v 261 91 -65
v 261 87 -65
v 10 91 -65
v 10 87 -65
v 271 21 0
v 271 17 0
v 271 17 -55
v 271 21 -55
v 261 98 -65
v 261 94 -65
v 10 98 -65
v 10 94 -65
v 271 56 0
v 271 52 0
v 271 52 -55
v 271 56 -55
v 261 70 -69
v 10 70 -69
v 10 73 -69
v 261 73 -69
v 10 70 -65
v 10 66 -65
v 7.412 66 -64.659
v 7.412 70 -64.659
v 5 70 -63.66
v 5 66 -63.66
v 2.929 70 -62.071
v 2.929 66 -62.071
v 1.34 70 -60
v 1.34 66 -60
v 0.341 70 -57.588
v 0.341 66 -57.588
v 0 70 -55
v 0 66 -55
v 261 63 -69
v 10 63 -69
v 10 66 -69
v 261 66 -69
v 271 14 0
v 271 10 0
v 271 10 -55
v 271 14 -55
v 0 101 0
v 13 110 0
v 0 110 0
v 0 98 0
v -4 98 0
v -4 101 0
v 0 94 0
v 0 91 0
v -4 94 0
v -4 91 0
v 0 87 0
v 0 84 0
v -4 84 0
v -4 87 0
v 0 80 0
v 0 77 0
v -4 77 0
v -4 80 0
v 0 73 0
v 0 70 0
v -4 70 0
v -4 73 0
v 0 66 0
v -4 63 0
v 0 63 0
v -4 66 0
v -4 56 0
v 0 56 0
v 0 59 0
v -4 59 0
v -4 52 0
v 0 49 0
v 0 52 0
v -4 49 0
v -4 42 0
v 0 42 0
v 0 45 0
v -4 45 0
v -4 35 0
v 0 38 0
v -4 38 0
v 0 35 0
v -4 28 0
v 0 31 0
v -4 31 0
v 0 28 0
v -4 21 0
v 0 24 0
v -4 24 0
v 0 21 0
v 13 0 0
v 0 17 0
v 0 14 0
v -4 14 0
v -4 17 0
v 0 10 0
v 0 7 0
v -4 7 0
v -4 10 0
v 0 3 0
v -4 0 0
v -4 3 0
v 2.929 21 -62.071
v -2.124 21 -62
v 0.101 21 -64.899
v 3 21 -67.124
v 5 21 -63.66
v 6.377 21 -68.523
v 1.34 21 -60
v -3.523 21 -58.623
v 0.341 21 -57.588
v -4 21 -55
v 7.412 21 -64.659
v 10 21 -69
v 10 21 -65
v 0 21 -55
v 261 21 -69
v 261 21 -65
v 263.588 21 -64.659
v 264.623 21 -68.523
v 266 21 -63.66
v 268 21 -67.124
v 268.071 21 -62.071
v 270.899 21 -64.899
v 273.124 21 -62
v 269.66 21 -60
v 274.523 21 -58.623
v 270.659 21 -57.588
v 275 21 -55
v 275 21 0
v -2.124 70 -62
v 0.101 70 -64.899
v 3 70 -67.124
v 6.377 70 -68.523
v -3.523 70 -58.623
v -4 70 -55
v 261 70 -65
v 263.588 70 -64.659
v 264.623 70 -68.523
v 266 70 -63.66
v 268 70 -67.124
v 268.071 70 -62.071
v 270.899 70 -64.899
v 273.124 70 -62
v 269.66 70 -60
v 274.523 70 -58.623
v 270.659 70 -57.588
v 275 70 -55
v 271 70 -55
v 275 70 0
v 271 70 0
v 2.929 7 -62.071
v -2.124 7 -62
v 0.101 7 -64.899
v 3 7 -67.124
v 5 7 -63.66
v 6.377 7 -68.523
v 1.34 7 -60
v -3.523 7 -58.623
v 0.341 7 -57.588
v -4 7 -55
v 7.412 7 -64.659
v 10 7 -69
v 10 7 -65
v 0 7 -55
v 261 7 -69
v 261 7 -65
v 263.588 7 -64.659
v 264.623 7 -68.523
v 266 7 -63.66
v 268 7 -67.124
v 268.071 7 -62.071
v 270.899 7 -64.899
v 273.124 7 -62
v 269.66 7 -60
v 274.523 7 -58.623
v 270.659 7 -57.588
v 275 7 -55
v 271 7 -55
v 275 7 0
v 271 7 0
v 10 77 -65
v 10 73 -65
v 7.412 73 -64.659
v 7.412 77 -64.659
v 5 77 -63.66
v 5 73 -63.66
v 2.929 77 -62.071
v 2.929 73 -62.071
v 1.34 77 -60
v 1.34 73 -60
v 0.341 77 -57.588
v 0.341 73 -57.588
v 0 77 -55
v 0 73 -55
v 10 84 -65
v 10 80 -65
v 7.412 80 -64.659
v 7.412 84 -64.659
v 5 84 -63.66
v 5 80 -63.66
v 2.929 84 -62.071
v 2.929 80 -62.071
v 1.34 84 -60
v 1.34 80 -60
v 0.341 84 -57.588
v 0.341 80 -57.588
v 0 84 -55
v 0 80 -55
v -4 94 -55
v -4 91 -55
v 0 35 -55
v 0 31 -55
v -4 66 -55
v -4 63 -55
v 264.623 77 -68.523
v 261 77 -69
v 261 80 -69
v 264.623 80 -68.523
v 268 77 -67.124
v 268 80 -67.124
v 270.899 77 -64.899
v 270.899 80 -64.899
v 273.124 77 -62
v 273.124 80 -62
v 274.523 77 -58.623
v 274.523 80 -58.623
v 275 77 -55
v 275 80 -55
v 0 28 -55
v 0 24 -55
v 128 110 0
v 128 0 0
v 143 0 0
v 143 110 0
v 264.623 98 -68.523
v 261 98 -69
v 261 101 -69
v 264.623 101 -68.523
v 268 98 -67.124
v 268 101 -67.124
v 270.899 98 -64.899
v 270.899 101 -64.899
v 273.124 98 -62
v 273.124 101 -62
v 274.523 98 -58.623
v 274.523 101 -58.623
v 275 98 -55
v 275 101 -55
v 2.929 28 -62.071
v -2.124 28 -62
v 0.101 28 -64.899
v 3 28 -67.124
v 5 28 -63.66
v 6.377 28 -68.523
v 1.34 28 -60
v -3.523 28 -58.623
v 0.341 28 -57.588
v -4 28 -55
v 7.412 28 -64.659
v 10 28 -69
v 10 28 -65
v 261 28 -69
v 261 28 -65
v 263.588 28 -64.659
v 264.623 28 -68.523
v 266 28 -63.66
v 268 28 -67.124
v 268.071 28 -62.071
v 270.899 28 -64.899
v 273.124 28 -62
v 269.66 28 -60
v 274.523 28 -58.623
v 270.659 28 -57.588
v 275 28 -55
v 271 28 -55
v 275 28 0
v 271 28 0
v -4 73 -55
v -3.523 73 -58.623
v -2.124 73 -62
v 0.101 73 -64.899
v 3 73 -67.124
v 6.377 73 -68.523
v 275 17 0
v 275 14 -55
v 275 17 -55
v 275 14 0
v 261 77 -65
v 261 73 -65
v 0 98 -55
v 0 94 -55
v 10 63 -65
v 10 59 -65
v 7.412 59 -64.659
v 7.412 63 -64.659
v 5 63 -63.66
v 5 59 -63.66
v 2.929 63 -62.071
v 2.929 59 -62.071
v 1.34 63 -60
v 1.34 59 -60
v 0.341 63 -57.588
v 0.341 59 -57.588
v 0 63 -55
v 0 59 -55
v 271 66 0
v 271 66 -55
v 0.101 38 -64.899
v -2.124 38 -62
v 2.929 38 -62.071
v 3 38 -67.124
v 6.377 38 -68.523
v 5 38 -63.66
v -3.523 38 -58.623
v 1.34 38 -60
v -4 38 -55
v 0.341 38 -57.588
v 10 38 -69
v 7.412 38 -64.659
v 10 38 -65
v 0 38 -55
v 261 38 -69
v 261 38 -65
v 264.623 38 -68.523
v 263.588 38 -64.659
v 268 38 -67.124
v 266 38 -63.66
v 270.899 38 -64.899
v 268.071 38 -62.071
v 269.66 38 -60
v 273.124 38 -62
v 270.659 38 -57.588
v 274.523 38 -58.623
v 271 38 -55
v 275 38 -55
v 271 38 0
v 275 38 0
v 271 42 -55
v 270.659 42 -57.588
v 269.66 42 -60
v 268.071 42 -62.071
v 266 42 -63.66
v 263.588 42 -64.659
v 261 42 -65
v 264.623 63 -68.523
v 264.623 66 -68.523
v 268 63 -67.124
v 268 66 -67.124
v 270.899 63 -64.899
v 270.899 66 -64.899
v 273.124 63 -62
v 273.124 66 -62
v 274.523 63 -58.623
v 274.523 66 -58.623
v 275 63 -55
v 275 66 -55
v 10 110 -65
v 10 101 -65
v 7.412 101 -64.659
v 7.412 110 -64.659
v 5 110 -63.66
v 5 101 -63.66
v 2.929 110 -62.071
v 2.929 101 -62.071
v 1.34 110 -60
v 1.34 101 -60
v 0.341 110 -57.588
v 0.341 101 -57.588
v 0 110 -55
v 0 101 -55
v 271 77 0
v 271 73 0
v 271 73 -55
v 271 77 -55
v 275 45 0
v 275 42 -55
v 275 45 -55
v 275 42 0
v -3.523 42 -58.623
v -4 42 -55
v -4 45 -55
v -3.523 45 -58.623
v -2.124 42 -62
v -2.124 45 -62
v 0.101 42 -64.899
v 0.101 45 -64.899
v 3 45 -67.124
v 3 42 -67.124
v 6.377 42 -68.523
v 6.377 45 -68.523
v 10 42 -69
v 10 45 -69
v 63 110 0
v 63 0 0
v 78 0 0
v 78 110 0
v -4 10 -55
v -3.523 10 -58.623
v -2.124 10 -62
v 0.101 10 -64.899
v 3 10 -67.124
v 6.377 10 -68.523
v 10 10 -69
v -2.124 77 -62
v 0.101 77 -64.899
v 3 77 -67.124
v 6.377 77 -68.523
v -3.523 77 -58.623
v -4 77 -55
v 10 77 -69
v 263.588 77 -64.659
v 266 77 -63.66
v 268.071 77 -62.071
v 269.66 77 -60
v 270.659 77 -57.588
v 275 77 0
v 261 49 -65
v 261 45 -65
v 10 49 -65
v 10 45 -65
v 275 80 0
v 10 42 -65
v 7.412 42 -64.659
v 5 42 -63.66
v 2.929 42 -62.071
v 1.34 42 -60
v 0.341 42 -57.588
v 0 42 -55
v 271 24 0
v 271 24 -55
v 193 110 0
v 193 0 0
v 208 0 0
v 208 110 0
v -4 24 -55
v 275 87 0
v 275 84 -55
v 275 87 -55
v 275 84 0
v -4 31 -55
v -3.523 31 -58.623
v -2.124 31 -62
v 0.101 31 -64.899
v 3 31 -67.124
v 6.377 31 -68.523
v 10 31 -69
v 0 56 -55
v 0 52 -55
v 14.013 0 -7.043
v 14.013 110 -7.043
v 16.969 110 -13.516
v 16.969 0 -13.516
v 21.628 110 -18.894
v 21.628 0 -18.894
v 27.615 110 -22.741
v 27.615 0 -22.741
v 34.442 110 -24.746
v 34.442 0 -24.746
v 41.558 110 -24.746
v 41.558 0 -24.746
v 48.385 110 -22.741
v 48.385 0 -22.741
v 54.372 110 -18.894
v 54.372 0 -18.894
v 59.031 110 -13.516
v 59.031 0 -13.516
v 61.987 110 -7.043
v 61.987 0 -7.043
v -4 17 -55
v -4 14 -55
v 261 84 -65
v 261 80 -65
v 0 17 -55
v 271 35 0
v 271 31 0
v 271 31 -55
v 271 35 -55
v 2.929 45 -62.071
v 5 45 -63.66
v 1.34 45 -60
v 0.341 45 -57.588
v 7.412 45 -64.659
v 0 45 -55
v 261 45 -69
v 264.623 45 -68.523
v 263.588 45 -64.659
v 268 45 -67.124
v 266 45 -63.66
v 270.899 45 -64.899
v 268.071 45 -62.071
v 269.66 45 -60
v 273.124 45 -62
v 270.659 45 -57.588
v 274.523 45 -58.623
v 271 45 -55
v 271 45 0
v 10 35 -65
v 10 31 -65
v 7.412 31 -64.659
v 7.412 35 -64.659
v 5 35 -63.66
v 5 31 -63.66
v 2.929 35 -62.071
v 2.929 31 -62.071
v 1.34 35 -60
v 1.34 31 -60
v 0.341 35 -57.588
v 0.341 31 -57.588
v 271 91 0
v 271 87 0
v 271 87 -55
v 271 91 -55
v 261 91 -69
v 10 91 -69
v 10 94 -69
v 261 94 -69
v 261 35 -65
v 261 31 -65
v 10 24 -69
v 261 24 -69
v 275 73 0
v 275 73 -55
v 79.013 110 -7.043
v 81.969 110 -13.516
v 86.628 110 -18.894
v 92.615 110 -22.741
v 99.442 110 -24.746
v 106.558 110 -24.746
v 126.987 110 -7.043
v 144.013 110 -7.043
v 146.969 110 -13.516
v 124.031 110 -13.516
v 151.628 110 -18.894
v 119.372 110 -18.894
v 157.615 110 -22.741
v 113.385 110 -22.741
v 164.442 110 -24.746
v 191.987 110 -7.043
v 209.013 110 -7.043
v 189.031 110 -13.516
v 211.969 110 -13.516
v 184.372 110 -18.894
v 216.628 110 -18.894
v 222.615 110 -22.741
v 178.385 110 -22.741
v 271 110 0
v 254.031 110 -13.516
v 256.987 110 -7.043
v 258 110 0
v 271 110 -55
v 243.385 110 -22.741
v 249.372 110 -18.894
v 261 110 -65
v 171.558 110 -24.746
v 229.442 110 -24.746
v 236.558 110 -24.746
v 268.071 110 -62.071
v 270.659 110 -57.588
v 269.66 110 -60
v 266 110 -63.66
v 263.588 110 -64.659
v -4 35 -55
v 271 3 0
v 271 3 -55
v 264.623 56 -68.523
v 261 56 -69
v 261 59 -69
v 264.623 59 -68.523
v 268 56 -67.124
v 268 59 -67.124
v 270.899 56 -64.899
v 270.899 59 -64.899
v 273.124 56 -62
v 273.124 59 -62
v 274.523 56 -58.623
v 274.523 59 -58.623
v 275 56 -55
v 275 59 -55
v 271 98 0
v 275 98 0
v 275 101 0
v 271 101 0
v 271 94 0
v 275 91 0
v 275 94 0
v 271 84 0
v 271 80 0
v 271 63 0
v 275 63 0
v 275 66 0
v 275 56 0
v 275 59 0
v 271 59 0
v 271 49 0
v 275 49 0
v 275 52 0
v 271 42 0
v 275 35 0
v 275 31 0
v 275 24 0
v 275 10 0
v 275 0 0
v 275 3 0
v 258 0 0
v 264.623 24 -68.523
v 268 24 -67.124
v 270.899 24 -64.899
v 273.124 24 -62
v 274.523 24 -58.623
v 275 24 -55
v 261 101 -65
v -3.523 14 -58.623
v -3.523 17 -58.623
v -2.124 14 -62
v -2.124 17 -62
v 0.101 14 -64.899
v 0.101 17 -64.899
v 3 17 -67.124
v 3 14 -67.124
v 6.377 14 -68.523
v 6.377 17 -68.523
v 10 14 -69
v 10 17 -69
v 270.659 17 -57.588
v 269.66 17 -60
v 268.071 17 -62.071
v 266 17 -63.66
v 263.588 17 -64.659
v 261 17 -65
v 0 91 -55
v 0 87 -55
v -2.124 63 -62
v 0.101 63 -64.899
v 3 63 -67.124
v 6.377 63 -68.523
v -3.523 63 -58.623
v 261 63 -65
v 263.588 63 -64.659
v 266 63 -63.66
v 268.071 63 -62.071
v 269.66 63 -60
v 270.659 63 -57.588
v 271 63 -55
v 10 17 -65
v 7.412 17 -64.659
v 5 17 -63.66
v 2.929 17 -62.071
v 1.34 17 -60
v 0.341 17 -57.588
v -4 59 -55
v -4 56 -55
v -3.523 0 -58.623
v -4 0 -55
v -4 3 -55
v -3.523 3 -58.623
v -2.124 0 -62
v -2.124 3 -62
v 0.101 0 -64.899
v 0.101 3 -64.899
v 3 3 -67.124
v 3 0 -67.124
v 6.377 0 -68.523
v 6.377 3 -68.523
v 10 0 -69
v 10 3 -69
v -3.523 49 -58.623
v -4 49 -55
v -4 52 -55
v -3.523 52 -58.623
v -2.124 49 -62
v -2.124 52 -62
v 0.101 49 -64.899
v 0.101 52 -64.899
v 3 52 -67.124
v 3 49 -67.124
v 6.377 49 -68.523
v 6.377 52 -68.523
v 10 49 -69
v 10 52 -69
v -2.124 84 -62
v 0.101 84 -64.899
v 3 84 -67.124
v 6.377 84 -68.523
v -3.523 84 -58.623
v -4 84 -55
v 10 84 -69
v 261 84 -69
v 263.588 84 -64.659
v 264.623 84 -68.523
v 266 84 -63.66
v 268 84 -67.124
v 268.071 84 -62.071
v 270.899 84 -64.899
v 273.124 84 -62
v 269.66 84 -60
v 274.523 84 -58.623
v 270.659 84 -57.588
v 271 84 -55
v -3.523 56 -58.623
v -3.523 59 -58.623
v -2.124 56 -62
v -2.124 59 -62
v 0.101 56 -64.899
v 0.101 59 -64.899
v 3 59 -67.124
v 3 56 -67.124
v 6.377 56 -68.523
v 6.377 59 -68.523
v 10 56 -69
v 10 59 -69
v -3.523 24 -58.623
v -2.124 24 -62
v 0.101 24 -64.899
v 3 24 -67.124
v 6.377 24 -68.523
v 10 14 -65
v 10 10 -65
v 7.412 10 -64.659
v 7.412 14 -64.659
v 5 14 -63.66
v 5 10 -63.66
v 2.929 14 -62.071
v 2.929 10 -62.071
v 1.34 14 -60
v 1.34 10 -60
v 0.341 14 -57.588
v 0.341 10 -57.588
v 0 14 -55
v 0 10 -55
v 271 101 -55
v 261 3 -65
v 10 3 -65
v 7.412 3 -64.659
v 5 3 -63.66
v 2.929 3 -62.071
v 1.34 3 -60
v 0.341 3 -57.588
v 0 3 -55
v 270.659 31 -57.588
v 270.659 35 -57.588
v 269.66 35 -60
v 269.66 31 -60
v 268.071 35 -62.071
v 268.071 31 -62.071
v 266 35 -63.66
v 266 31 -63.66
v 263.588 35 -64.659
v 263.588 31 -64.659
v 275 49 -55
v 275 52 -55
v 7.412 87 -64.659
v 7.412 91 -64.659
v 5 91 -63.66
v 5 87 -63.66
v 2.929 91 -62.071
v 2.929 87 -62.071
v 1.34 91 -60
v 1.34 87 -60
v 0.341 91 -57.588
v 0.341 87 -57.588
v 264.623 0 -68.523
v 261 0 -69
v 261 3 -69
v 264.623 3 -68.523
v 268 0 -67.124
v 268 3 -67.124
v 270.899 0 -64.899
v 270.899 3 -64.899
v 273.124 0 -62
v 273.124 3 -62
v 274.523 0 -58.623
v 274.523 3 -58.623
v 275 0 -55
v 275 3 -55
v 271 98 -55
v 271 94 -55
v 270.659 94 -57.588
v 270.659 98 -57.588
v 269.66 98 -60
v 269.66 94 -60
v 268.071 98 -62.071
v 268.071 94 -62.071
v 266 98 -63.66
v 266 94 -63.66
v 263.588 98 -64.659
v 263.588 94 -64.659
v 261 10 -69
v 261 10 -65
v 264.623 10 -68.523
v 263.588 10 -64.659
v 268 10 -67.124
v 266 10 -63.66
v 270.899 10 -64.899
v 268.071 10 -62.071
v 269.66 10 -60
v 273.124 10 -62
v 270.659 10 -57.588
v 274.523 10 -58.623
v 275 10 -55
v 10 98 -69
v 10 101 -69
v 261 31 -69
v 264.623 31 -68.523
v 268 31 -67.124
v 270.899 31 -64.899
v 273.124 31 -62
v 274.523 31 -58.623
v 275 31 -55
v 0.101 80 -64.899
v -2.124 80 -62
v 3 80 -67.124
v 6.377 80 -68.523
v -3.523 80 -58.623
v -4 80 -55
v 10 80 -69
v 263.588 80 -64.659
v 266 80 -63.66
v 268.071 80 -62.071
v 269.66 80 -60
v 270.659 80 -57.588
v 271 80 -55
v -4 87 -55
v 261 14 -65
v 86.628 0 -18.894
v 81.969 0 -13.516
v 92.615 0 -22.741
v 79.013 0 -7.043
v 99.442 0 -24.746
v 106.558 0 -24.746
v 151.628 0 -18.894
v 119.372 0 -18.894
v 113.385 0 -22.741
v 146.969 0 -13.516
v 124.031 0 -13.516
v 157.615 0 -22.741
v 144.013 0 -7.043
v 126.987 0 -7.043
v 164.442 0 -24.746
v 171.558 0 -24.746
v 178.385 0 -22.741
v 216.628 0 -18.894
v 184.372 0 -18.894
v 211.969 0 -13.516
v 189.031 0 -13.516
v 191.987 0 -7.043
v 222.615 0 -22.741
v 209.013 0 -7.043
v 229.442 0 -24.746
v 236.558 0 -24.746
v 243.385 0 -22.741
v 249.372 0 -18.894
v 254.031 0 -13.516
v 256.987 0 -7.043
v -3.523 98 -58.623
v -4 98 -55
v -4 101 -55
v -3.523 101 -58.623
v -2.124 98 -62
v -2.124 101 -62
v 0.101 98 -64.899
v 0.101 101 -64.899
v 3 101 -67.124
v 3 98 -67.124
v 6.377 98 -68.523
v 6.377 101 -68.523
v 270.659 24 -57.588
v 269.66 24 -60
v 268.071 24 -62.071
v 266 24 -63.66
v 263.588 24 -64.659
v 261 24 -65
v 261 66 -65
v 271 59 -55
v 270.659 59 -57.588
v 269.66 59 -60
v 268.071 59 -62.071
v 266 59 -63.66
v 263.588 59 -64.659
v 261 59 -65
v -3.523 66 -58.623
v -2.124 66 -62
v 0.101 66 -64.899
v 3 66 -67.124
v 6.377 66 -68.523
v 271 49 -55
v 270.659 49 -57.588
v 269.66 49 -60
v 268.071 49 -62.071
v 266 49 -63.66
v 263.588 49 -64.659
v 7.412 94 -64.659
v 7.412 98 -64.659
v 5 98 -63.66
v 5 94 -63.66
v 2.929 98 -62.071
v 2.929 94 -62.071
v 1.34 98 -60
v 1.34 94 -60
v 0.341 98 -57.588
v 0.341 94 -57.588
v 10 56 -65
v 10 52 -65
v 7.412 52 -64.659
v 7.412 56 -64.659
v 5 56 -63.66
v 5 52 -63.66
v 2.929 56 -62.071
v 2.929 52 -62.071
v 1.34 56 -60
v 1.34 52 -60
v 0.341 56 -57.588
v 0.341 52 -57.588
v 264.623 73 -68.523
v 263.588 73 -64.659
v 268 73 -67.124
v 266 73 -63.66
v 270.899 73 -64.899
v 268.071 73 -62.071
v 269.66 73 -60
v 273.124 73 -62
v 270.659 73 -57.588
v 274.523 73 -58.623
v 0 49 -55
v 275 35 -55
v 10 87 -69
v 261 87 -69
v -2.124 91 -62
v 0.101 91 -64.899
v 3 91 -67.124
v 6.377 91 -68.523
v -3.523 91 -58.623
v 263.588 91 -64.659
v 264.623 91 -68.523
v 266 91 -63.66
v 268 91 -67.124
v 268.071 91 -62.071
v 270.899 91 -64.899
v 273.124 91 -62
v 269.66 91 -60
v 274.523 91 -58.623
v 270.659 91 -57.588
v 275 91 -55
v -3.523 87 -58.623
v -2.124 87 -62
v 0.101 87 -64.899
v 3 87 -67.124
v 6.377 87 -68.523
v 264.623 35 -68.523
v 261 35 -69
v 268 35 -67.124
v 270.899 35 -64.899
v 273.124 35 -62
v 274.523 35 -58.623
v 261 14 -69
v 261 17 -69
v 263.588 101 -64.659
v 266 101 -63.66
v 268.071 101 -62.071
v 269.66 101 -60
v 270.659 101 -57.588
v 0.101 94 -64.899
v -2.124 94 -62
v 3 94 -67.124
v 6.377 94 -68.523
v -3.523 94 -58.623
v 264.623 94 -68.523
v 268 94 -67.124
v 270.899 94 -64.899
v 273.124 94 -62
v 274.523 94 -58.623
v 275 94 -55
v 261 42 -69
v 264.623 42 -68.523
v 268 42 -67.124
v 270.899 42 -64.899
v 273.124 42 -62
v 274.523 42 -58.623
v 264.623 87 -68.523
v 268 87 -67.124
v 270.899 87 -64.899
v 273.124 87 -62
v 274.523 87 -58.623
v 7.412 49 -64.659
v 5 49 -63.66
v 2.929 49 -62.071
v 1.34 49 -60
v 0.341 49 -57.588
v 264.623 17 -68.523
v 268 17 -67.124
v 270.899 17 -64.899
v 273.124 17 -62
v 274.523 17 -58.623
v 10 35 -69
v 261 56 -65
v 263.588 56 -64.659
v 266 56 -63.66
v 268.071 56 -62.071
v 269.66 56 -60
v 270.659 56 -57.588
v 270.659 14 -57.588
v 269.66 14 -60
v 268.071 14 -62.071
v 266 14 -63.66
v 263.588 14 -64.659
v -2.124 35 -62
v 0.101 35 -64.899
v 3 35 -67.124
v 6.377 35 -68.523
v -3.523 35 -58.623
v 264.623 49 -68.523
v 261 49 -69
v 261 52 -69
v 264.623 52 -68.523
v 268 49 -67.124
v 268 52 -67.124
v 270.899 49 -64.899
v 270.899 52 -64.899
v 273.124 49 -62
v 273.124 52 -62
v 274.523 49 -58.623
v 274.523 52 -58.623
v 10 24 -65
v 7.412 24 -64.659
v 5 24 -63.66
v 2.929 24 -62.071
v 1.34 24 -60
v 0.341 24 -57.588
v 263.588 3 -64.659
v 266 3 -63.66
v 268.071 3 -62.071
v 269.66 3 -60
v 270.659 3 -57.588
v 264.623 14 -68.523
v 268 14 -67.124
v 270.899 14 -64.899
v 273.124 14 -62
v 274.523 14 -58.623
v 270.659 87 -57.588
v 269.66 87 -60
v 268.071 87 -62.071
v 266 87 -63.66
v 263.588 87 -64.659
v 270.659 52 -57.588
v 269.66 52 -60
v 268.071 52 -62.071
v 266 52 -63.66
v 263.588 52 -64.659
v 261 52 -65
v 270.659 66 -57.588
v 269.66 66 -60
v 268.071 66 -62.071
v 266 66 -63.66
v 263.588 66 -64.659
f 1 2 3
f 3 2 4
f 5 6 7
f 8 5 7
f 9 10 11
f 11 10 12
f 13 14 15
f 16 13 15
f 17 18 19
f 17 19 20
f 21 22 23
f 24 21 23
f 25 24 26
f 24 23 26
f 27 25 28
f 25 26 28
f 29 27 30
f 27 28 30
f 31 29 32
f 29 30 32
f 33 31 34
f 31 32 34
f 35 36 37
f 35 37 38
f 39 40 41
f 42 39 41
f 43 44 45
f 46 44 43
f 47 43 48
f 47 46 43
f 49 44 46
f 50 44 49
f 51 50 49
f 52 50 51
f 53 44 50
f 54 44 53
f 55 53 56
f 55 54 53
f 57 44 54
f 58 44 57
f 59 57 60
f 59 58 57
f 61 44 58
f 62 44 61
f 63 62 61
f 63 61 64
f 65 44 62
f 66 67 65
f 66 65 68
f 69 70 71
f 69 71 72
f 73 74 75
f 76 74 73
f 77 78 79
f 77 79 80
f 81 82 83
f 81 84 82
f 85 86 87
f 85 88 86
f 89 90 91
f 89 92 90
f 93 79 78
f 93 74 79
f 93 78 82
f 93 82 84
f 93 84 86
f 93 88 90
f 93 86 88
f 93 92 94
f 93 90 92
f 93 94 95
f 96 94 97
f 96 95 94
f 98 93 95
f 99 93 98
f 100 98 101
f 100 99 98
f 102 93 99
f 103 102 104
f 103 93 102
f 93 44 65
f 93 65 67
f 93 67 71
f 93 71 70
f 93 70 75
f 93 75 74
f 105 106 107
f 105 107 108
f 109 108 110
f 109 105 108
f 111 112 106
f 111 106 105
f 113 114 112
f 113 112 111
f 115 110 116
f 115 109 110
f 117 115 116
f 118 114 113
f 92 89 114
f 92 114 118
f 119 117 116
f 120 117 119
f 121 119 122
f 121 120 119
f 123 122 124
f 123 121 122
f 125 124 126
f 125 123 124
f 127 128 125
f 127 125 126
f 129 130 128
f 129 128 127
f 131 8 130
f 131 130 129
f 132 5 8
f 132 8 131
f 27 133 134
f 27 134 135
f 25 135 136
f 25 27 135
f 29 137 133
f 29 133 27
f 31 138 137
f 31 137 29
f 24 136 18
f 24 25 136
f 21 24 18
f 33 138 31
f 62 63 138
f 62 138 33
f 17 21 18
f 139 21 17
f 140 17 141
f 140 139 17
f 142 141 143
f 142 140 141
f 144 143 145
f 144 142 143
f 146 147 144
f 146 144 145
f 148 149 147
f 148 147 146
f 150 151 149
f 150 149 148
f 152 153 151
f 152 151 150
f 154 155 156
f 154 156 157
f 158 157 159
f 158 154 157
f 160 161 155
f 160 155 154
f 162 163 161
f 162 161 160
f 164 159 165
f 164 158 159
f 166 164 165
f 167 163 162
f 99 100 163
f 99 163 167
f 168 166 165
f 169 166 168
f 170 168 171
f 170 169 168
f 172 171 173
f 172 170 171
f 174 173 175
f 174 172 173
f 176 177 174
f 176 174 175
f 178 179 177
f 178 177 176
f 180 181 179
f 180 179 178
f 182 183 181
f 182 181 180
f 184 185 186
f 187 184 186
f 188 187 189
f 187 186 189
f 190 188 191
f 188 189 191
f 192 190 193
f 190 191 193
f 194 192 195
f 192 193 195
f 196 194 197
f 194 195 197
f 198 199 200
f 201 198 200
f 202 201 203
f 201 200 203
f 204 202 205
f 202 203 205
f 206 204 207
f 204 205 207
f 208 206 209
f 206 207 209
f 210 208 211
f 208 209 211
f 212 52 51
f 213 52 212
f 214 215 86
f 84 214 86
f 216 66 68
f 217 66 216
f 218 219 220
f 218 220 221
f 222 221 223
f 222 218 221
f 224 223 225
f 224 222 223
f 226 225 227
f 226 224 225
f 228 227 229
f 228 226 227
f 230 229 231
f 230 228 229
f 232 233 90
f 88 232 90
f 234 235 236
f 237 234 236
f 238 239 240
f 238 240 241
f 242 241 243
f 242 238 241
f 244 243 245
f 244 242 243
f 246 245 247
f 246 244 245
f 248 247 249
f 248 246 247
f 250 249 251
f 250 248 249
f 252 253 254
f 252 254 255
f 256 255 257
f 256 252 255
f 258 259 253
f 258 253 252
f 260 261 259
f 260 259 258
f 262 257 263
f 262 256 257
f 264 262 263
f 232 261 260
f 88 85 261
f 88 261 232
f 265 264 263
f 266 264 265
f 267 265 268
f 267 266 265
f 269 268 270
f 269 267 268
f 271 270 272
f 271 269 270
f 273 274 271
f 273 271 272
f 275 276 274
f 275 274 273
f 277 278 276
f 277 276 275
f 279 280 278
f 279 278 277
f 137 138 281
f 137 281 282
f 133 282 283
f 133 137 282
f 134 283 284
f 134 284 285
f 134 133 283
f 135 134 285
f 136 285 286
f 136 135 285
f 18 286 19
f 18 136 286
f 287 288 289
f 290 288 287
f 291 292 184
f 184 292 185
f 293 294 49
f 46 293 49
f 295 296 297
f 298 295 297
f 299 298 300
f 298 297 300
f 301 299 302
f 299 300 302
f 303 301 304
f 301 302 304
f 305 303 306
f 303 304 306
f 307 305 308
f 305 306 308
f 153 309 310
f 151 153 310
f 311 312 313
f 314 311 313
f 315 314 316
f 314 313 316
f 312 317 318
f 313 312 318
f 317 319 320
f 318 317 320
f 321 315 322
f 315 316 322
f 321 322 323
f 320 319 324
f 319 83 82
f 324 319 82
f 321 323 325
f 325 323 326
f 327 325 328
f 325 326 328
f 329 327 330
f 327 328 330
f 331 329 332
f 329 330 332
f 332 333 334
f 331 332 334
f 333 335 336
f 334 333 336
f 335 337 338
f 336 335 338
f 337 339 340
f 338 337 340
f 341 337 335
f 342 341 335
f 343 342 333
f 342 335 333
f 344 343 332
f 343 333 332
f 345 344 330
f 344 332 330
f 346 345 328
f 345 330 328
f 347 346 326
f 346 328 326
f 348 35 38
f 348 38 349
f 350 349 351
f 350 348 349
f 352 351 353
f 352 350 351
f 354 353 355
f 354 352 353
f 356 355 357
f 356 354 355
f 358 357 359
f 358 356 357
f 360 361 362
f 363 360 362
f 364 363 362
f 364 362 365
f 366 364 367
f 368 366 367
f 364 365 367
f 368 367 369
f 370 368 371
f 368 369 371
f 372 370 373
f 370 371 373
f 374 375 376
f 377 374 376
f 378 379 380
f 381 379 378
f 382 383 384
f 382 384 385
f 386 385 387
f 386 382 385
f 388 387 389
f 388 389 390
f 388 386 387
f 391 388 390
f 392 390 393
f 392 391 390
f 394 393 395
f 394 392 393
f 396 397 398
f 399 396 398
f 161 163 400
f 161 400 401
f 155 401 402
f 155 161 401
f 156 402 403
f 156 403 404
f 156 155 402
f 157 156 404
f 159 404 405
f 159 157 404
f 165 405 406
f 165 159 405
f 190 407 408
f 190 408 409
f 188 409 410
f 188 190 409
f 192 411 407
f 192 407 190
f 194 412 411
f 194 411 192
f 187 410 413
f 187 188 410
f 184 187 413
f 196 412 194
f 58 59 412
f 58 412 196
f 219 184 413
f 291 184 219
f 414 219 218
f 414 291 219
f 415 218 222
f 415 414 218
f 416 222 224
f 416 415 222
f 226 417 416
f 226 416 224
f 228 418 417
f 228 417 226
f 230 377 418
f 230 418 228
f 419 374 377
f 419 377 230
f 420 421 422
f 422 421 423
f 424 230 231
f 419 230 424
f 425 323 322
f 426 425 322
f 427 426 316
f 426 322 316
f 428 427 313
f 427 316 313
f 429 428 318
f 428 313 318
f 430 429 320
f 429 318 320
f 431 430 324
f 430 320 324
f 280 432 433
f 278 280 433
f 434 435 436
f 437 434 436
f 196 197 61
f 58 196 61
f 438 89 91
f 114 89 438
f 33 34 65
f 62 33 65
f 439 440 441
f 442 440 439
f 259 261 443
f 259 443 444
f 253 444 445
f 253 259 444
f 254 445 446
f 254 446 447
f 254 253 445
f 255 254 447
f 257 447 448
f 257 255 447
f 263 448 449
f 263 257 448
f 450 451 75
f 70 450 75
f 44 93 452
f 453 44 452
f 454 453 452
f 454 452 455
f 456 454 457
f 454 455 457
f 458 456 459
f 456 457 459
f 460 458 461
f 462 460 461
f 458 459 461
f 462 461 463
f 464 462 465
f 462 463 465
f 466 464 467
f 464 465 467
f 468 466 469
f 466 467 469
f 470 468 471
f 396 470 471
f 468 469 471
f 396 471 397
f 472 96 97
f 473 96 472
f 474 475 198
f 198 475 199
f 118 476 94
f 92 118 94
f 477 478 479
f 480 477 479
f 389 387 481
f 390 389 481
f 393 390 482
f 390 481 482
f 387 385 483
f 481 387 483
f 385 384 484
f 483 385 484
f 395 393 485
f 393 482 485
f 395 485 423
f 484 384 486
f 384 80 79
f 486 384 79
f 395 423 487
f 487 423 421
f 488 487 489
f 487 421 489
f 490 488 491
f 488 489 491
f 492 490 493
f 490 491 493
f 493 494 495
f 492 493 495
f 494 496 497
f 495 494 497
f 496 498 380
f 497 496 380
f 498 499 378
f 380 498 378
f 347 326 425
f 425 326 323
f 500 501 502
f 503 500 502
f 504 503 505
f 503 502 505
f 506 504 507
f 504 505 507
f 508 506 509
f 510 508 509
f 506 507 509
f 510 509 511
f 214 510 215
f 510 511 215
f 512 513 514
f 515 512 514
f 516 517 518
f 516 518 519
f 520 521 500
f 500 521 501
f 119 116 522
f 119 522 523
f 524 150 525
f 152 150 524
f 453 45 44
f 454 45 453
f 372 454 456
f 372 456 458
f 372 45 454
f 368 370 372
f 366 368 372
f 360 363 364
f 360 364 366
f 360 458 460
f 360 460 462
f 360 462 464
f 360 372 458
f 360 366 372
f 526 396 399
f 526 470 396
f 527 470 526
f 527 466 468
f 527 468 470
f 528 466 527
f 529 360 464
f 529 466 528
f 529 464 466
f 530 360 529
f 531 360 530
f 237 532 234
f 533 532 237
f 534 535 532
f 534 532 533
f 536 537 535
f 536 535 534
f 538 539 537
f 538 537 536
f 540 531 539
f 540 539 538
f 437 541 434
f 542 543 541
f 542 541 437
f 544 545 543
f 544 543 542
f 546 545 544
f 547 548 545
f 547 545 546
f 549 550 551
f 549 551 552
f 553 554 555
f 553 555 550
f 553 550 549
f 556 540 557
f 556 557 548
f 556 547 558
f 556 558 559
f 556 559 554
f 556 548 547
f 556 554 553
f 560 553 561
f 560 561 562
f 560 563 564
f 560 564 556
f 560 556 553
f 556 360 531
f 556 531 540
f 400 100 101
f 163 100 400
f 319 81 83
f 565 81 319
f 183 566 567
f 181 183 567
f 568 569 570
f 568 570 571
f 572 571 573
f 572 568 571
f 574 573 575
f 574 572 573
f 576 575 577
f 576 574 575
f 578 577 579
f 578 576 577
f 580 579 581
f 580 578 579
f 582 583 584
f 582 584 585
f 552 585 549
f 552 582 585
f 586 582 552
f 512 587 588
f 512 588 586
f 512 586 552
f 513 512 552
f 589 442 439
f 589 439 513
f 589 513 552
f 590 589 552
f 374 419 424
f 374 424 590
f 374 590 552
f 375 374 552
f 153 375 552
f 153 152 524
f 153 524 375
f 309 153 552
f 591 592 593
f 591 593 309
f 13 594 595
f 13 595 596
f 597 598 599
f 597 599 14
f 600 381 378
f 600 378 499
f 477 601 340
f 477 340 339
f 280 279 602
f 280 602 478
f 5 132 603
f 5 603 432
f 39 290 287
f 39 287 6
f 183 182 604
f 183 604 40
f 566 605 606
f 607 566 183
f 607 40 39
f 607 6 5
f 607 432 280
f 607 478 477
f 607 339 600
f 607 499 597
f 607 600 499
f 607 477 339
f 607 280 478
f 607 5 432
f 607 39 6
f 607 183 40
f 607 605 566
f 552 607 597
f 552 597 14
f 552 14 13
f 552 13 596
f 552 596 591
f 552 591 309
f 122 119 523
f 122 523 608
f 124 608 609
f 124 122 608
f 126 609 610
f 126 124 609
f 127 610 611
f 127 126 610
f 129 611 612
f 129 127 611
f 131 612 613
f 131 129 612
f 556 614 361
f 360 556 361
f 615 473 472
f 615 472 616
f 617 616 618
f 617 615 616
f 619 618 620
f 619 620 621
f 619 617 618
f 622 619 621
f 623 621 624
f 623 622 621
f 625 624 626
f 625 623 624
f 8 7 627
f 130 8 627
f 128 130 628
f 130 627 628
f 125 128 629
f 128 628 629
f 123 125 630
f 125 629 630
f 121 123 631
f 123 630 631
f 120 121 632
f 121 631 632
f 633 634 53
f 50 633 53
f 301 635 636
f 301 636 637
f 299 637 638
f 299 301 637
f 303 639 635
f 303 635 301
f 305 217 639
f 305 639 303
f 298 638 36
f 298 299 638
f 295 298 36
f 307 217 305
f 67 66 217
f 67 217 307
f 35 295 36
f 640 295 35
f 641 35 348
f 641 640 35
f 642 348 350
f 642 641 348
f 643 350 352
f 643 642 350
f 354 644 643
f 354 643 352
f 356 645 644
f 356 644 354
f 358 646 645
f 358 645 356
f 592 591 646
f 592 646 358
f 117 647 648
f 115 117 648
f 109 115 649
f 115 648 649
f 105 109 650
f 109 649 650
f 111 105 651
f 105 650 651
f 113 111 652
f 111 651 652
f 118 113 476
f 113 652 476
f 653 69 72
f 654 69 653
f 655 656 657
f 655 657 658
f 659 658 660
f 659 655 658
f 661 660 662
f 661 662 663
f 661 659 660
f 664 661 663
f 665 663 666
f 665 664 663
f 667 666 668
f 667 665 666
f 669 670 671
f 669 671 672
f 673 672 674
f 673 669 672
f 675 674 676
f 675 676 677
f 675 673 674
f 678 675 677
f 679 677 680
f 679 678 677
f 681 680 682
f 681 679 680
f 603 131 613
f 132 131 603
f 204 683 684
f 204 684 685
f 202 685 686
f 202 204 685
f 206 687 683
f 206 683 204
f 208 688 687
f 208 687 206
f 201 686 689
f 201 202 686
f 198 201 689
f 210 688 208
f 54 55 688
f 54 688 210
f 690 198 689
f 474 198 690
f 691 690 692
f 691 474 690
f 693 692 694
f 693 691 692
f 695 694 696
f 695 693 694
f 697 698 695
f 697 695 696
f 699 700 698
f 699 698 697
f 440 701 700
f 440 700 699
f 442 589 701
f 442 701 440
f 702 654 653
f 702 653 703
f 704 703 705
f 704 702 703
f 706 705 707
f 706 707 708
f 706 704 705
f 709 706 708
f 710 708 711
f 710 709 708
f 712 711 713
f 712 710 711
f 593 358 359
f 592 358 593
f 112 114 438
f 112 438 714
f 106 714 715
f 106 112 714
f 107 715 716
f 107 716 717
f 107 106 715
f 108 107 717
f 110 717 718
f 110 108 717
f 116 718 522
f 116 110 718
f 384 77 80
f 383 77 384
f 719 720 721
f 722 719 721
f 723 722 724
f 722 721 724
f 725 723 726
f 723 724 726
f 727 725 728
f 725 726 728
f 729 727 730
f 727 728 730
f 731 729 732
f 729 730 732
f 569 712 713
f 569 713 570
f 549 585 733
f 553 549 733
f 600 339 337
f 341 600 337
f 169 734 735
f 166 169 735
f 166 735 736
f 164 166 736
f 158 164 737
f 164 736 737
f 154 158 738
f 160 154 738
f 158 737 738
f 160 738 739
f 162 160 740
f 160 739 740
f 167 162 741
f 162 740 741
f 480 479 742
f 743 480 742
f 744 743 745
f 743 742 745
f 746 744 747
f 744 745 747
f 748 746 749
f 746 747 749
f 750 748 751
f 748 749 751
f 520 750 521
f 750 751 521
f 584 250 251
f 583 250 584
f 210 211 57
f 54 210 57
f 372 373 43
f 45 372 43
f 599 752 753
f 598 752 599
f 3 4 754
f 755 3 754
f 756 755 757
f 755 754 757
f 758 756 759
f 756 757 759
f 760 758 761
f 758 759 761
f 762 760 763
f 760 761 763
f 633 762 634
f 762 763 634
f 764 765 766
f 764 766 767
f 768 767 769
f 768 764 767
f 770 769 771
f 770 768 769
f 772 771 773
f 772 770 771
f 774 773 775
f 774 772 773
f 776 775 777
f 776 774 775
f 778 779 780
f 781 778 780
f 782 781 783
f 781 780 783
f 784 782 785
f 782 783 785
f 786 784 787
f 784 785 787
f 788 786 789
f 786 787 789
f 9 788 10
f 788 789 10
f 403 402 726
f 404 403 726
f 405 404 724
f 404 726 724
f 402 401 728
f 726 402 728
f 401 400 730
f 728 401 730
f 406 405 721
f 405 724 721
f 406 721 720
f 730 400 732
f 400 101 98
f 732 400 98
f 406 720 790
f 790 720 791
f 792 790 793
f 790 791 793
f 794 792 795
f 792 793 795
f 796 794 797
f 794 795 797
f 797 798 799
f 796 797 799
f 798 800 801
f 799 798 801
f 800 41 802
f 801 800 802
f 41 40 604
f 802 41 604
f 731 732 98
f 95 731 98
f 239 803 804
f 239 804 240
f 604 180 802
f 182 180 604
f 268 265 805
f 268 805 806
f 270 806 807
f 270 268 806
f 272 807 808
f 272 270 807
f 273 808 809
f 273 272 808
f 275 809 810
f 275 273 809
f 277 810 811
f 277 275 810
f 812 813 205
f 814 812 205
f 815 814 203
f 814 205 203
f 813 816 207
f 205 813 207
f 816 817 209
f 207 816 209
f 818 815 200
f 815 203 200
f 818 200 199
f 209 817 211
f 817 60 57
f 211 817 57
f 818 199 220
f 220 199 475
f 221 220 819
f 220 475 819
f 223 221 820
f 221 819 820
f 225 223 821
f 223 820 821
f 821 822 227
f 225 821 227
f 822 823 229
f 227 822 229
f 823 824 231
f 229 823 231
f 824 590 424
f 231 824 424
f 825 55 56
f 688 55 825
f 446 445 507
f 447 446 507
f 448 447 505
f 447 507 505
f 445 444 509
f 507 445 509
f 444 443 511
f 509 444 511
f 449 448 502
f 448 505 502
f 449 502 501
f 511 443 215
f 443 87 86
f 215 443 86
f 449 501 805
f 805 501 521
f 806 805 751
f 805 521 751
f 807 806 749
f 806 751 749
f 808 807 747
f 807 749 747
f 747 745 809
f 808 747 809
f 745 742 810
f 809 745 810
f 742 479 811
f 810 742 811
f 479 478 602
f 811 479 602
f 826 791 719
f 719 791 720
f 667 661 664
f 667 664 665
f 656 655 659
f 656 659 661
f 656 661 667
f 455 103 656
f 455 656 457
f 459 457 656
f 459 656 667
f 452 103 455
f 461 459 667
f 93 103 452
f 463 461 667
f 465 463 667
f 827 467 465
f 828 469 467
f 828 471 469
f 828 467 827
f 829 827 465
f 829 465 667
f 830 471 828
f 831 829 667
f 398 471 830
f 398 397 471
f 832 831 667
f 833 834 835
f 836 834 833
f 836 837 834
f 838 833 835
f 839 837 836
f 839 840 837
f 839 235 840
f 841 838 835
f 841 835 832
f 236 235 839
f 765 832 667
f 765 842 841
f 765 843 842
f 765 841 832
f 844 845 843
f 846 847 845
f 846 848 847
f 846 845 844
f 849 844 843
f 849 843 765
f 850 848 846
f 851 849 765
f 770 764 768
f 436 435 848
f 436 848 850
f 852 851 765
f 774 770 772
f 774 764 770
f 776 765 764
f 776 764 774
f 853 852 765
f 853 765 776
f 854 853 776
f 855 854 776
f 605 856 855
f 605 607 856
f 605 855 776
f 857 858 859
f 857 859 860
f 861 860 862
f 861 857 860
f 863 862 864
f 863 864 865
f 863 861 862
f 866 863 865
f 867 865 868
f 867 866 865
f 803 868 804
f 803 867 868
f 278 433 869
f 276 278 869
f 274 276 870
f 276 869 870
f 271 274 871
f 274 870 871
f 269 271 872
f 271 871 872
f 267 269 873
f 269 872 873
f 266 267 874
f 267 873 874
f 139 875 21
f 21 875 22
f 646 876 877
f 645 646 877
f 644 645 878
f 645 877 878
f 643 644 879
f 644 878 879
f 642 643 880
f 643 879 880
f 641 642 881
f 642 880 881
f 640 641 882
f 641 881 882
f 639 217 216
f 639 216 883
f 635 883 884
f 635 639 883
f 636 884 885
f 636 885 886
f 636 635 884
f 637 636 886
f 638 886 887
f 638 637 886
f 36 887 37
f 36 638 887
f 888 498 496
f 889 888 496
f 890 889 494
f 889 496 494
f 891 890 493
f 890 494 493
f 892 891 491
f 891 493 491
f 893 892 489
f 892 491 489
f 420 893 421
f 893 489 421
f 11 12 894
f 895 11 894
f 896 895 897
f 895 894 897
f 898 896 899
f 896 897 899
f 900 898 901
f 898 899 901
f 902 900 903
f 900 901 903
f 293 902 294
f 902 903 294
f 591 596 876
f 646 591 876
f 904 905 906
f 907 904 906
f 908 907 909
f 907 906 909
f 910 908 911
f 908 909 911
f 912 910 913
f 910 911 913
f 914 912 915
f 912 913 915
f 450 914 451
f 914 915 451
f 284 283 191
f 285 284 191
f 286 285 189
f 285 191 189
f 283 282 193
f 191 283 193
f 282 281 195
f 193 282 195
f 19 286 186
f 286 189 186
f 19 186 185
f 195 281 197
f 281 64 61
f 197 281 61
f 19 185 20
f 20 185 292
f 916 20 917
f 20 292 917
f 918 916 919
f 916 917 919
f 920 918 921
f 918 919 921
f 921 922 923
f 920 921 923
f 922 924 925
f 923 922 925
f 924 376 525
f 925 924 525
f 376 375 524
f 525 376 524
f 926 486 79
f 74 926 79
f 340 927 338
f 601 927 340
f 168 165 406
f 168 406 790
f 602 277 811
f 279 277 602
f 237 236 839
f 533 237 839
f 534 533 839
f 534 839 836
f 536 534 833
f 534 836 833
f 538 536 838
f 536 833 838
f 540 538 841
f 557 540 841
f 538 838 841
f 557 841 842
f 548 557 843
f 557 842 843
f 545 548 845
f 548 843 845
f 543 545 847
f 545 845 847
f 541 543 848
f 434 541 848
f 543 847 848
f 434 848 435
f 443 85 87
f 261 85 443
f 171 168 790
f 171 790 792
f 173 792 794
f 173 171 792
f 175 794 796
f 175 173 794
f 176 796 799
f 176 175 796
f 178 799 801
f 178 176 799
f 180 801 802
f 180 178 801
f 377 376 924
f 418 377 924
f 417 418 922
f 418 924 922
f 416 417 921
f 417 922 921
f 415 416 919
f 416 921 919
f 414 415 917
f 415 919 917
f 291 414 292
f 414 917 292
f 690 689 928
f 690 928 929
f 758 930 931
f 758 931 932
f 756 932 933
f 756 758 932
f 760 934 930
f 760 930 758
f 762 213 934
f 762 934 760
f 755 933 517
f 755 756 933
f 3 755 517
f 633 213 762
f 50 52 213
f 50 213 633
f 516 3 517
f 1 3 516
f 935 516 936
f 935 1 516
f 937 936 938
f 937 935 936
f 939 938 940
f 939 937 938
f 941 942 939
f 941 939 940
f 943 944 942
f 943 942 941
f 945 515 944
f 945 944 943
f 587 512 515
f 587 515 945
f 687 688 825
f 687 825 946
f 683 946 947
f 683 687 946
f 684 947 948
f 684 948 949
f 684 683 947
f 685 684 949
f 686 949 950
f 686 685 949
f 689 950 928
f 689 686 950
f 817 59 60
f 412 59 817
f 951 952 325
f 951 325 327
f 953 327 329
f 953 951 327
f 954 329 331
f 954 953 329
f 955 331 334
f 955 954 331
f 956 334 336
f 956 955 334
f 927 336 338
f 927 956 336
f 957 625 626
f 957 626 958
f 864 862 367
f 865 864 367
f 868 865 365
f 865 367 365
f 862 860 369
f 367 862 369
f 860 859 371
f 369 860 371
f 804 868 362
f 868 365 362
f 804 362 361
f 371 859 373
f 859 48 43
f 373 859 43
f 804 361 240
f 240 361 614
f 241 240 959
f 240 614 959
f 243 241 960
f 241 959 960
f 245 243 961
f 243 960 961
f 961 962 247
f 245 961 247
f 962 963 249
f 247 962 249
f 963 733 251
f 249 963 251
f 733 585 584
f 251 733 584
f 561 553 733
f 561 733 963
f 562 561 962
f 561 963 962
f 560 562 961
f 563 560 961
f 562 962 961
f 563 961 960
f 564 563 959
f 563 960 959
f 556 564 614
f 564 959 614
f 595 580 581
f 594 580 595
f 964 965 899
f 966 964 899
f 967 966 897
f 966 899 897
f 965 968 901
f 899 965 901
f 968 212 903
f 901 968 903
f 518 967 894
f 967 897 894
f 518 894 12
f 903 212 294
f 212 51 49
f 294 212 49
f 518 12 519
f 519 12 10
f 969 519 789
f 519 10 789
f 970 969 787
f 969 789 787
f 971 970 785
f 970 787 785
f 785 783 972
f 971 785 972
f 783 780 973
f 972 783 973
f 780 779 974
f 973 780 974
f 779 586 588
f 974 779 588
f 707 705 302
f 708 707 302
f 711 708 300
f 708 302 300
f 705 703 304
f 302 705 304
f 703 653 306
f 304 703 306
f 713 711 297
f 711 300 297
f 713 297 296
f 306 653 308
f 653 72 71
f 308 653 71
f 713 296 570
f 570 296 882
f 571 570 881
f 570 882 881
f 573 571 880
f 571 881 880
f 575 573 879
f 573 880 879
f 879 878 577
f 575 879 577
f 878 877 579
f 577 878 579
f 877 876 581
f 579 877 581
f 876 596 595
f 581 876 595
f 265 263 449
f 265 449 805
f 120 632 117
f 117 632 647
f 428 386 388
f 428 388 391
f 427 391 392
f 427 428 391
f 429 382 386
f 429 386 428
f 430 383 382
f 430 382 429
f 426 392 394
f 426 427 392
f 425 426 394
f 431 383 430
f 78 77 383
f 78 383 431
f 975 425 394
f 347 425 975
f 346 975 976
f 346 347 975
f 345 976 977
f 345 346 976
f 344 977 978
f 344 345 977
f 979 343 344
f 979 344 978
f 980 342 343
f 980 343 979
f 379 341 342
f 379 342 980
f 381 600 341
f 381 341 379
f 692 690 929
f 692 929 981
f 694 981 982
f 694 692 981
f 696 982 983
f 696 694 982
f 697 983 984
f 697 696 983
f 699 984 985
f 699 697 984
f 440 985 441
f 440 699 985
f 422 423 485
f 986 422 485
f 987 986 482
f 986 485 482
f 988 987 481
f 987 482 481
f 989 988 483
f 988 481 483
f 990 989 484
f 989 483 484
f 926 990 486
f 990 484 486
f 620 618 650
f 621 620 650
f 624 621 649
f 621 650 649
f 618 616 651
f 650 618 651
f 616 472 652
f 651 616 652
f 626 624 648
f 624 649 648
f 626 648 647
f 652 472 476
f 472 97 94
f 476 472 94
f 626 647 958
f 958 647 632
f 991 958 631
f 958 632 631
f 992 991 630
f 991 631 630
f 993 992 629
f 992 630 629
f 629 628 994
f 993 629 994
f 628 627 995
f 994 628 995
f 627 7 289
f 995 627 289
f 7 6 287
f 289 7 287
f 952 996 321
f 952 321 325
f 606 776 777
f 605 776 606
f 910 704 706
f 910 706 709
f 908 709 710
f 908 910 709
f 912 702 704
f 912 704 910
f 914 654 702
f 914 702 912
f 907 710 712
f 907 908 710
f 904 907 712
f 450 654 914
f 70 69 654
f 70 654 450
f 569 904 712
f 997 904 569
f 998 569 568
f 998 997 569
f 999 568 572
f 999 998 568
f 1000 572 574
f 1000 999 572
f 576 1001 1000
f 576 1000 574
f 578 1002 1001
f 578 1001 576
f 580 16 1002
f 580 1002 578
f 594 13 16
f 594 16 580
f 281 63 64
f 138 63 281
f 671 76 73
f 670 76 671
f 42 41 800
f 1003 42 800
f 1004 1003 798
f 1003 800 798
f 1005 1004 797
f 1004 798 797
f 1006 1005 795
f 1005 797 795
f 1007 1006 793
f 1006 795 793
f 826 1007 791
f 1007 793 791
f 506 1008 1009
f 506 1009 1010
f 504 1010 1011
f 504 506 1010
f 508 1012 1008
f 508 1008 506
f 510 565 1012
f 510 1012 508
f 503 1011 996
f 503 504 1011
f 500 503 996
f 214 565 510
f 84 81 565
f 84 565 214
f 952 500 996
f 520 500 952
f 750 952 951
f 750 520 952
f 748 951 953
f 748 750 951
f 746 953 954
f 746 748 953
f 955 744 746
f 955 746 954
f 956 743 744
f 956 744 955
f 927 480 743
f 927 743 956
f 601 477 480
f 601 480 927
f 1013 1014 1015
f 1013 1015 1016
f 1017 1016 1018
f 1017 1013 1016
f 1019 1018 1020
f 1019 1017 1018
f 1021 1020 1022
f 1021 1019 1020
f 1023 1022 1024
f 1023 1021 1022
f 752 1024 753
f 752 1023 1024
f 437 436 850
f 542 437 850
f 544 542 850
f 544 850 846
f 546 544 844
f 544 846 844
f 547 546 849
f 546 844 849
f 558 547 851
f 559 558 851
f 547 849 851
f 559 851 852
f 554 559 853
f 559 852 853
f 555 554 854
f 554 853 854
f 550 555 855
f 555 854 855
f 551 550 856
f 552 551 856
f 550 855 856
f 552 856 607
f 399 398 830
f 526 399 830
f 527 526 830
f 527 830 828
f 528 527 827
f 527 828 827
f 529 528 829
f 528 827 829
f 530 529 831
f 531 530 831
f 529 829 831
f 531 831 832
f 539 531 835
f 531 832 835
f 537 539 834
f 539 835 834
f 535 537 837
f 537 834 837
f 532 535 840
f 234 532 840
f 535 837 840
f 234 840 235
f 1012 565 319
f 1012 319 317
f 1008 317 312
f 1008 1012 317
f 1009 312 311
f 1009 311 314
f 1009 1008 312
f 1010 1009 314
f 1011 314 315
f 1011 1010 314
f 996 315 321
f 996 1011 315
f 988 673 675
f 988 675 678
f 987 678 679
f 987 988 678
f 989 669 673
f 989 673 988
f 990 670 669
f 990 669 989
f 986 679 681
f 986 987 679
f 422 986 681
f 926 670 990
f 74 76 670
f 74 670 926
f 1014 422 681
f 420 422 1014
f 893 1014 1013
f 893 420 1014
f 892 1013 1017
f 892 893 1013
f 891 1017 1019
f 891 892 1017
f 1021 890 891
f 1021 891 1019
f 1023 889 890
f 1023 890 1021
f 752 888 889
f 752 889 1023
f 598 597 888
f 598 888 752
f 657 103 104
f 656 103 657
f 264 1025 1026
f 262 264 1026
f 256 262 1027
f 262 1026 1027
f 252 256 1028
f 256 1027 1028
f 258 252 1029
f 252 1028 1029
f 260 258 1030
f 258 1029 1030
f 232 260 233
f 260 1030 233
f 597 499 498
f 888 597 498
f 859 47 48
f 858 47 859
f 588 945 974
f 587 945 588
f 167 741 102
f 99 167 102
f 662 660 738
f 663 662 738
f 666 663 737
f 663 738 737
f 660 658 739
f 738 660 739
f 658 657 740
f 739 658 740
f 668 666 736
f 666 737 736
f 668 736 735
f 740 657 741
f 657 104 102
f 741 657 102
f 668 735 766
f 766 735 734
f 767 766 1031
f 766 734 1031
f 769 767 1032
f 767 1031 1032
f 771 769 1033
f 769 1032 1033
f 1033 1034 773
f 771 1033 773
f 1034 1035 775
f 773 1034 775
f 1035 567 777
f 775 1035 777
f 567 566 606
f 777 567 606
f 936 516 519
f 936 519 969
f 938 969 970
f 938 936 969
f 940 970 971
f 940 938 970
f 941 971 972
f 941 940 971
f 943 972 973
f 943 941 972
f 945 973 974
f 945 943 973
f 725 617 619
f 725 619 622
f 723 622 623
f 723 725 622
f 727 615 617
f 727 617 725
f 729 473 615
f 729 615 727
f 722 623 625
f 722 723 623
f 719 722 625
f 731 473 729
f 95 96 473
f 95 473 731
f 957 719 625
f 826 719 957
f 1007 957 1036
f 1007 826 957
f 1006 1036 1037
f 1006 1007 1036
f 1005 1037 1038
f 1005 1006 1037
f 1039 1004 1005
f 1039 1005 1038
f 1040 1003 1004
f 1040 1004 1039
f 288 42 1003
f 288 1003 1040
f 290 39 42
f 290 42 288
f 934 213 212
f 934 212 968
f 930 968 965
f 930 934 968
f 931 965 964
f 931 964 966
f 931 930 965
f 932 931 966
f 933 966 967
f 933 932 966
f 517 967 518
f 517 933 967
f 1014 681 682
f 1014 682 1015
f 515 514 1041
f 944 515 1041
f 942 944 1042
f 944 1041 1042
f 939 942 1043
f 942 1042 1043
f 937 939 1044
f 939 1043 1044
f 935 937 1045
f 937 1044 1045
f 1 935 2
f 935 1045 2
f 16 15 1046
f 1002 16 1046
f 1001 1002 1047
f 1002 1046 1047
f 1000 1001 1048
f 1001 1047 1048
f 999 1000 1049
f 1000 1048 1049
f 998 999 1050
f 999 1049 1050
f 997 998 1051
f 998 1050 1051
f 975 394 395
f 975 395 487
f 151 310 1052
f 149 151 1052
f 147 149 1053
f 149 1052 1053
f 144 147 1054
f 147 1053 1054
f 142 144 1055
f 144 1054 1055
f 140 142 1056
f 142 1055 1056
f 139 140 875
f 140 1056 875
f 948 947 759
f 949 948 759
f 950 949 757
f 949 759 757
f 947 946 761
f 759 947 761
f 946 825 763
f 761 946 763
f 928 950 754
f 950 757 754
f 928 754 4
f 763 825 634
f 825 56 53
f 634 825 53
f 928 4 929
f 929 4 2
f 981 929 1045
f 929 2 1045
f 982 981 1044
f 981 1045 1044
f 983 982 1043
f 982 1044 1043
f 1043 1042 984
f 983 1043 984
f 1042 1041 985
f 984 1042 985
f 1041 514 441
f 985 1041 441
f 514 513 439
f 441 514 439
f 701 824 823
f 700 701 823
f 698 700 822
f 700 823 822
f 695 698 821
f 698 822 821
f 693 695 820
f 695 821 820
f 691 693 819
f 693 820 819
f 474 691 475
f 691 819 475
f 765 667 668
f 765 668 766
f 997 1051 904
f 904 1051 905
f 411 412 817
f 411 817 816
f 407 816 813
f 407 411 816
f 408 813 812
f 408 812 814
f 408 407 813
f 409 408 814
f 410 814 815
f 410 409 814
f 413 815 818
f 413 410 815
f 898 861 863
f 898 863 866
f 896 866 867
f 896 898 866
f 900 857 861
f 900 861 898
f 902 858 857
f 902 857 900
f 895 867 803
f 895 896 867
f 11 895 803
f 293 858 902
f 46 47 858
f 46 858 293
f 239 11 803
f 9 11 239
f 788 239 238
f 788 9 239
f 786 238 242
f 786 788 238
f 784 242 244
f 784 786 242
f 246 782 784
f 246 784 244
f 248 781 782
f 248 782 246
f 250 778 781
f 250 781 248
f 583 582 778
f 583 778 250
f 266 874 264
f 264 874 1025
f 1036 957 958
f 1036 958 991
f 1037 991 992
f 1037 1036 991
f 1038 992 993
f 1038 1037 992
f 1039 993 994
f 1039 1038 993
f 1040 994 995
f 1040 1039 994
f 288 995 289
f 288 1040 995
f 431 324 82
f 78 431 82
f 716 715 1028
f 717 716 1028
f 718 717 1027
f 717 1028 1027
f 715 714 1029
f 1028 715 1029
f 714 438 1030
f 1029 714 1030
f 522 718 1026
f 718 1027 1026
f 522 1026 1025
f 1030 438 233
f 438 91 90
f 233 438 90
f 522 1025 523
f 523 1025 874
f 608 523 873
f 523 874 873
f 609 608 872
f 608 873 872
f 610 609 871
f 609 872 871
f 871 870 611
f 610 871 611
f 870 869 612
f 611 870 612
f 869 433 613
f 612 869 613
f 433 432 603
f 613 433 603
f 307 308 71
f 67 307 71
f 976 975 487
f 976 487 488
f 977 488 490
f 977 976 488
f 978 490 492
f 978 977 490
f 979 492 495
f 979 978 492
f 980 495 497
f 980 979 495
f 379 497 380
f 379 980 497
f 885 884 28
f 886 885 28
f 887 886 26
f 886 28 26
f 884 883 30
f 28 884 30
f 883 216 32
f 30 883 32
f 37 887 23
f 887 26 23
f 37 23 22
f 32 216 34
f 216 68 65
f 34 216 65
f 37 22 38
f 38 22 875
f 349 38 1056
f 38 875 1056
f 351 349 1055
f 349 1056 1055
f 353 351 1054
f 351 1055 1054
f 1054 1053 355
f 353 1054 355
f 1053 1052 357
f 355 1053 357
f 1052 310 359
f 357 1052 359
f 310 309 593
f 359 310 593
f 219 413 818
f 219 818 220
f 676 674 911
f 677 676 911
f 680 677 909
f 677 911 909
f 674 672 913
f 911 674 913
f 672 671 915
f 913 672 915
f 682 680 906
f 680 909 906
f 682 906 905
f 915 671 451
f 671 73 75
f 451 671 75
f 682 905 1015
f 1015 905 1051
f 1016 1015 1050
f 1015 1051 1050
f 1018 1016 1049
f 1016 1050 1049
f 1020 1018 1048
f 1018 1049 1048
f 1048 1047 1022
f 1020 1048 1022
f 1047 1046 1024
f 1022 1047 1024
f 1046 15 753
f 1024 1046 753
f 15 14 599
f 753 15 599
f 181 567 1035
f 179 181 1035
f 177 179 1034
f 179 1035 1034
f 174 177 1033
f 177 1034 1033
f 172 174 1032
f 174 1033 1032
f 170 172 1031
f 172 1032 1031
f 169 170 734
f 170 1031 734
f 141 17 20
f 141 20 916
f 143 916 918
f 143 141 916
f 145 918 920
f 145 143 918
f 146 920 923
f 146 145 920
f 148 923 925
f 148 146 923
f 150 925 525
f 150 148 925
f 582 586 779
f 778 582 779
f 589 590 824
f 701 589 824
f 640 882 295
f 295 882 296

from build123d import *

# Parameters (mm, degrees)
BOSS_EXTRUDE1_DEPTH = 110
BOSS_EXTRUDE2_DEPTH = 3
LPATTERN1_COUNT     = 15
LPATTERN1_PITCH     = 7


with BuildPart() as part:
    # Sketch1 → Boss-Extrude1 (new body)
    with BuildSketch(Plane(origin=(0, 0, 0), x_dir=(1, 0, 0), z_dir=(0, 1, 0))):
        with BuildLine():
            Line((63, 0), (78, 0))
            ThreePointArc((78, 0), (103, 25), (128, 0))
            Line((128, 0), (143, 0))
            ThreePointArc((143, 0), (168, 25), (193, 0))
            Line((193, 0), (208, 0))
            ThreePointArc((208, 0), (233, 25), (258, 0))
            Line((258, 0), (271, 0))
            Line((271, 0), (271, 55))
            ThreePointArc((271, 55), (268.071067812, 62.071067812), (261, 65))
            Line((261, 65), (10, 65))
            ThreePointArc((10, 65), (2.928932188, 62.071067812), (0, 55))
            Line((0, 55), (0, 0))
            Line((0, 0), (13, 0))
            ThreePointArc((13, 0), (38, 25), (63, 0))
        make_face()
    extrude(amount=BOSS_EXTRUDE1_DEPTH)

    # Sketch4 → Boss-Extrude2 (add)
    with BuildSketch(Plane.XZ):
        with BuildLine():
            Line((-4, 0), (-4, -55))
            ThreePointArc((-4, -55), (0.100505063, -64.899494937), (10, -69))
            Line((10, -69), (261, -69))
            ThreePointArc((261, -69), (270.899494937, -64.899494937), (275, -55))
            Line((275, -55), (275, 0))
            Line((275, 0), (271, 0))
            Line((271, 0), (271, -55))
            ThreePointArc((271, -55), (268.071067812, -62.071067812), (261, -65))
            Line((261, -65), (10, -65))
            ThreePointArc((10, -65), (2.928932188, -62.071067812), (0, -55))
            Line((0, -55), (0, 0))
            Line((0, 0), (-4, 0))
        make_face()
    boss_extrude2 = extrude(amount=-BOSS_EXTRUDE2_DEPTH)

    # LPattern1: Boss-Extrude2 ×15
    with Locations(*[(0, i * LPATTERN1_PITCH, 0) for i in range(1, LPATTERN1_COUNT)]):
        add(boss_extrude2)


solid = part.part
